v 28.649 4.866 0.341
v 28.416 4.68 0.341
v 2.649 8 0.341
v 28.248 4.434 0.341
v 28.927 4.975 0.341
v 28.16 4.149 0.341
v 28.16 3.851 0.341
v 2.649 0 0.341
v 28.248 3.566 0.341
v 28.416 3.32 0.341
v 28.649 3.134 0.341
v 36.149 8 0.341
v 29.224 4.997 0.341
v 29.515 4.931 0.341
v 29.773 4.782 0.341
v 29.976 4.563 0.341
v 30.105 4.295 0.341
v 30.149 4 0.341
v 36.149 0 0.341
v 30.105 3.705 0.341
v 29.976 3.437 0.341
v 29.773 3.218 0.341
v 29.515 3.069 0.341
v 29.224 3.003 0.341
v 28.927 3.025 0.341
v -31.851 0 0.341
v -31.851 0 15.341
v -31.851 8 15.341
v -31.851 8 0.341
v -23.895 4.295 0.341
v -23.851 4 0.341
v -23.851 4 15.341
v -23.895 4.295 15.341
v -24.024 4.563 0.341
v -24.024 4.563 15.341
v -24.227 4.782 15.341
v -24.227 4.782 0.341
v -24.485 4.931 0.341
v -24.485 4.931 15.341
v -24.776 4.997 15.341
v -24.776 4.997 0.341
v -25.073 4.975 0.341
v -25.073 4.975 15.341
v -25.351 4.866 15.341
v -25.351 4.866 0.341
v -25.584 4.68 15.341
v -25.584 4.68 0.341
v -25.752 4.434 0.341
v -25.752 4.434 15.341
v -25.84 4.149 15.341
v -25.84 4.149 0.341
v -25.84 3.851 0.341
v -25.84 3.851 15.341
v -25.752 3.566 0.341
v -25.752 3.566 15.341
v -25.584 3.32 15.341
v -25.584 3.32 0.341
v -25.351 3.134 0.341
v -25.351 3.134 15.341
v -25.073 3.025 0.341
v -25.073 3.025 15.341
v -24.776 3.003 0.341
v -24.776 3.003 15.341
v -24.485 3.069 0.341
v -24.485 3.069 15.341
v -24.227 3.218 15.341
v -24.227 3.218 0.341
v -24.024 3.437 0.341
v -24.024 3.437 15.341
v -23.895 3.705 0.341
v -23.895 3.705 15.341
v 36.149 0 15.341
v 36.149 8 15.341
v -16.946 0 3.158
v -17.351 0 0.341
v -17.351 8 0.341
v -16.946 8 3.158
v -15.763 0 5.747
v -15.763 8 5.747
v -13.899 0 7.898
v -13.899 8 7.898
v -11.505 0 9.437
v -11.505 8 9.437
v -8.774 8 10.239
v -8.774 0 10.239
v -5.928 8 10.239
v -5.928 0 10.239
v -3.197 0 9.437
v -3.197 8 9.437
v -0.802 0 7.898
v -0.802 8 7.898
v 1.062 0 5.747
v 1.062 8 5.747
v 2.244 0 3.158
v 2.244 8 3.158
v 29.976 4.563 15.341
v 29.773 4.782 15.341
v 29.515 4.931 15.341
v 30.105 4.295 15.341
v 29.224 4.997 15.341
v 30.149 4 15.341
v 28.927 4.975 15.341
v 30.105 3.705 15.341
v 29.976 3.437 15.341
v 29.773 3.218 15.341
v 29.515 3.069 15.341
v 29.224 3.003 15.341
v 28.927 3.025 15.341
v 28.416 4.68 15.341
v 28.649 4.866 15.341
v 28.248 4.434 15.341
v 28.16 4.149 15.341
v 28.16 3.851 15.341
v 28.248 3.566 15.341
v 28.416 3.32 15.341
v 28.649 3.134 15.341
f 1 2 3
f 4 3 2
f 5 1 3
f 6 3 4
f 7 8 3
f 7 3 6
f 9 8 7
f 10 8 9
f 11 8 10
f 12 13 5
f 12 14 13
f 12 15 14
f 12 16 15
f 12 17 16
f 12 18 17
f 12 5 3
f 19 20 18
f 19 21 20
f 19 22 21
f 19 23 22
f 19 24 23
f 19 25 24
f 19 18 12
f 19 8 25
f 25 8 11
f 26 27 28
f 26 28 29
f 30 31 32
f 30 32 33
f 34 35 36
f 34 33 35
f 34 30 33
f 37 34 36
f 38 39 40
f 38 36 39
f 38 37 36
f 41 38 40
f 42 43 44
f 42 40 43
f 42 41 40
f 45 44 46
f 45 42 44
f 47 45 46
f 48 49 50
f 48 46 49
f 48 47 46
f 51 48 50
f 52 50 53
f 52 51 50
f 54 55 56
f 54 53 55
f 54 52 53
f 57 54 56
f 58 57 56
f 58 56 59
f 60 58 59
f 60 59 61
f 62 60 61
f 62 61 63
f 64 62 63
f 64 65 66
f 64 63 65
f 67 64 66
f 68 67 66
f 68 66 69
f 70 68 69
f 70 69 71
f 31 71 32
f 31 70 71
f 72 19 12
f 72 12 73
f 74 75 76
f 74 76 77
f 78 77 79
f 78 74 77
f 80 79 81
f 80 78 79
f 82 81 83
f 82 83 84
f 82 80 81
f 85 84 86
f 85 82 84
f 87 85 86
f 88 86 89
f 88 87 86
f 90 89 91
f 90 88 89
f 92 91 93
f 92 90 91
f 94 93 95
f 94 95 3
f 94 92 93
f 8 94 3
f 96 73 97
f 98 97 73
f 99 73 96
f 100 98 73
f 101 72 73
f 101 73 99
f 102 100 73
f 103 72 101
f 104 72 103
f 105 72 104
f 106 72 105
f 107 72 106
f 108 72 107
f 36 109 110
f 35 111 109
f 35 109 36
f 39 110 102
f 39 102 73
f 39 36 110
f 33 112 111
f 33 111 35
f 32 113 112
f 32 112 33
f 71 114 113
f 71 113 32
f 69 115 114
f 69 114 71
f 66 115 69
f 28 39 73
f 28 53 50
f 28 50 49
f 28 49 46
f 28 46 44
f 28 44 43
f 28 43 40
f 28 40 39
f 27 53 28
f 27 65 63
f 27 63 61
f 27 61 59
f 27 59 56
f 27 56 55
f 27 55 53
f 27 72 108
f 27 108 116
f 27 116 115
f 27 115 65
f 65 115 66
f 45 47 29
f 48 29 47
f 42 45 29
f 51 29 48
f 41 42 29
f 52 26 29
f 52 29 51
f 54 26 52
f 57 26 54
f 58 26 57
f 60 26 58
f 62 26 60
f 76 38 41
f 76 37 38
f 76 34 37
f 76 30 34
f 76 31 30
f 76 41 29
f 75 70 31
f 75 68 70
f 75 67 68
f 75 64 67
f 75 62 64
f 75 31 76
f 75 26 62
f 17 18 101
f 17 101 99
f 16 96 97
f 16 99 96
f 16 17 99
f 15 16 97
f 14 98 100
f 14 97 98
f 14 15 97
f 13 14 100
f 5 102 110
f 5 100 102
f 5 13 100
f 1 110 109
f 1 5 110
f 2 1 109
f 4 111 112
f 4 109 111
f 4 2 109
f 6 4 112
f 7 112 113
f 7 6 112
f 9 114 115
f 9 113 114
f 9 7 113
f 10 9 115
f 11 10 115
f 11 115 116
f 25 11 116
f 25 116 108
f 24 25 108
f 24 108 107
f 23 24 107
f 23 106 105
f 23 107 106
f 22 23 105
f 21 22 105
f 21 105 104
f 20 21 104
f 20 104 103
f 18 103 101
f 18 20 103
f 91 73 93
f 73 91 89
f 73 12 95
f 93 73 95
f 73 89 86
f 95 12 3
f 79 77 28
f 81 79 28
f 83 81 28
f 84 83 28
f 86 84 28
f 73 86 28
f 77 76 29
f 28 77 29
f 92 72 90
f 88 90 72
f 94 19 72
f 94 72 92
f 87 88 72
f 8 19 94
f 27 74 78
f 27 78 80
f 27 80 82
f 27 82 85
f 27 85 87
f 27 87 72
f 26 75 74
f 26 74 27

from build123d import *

# Parameters (mm, degrees)
BOSS_EXTRUDE1_DEPTH = 8
SKETCH2_R           = 1
CUT_EXTRUDE1_DEPTH  = 16.340604027


with BuildPart() as part:
    # Sketch1 → Boss-Extrude1 (new body)
    with BuildSketch(Plane(origin=(0, 0, 0), x_dir=(1, 0, 0), z_dir=(0, 1, 0))):
        with BuildLine():
            Line((2.649328859, -0.340604027), (36.149328859, -0.340604027))
            Line((36.149328859, -0.340604027), (36.149328859, -15.340604027))
            Line((36.149328859, -15.340604027), (-31.850671141, -15.340604027))
            Line((-31.850671141, -15.340604027), (-31.850671141, -0.340604027))
            Line((-31.850671141, -0.340604027), (-17.350671141, -0.340604027))
            ThreePointArc((-17.350671141, -0.340604027), (-7.350671141, -10.340604027), (2.649328859, -0.340604027))
        make_face()
    extrude(amount=BOSS_EXTRUDE1_DEPTH)

    # Sketch2 → Cut-Extrude1 (cut, through all)
    with BuildSketch(Plane.XY):
        with Locations((-24.850671141, 4)):
            Circle(SKETCH2_R)
        with Locations((29.149328859, 4)):
            Circle(SKETCH2_R)
    extrude(amount=CUT_EXTRUDE1_DEPTH, mode=Mode.SUBTRACT)


solid = part.part
